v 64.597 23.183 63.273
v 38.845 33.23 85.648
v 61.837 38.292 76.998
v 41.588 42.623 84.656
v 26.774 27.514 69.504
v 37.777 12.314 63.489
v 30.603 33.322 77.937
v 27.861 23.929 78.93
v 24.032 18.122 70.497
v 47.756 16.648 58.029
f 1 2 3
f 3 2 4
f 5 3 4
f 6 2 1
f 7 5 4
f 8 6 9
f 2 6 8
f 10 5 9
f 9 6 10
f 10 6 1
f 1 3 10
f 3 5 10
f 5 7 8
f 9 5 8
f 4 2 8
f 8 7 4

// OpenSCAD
// Auto-generated auxetic polyhedron
points = [
    [61.837028, 38.291501, 76.998245],
    [38.845174, 33.230070, 85.647898],
    [64.597330, 23.183032, 63.272628],
    [41.587840, 42.622578, 84.655544],
    [26.774497, 27.514203, 69.504344],
    [37.776515, 12.313852, 63.489149],
    [30.603458, 33.321950, 77.937477],
    [24.031832, 18.121695, 70.496698],
    [27.860793, 23.929442, 78.929831],
    [47.755745, 16.647940, 58.028572],
];

faces = [
    [0, 1, 2],
    [3, 1, 0],
    [3, 0, 4],
    [2, 1, 5],
    [3, 4, 6],
    [7, 5, 8],
    [8, 5, 1],
    [7, 4, 9],
    [9, 5, 7],
    [2, 5, 9],
    [9, 0, 2],
    [9, 4, 0],
    [8, 6, 4],
    [8, 4, 7],
    [8, 1, 3],
    [3, 6, 8],
];

polyhedron(points = points, faces = faces);
